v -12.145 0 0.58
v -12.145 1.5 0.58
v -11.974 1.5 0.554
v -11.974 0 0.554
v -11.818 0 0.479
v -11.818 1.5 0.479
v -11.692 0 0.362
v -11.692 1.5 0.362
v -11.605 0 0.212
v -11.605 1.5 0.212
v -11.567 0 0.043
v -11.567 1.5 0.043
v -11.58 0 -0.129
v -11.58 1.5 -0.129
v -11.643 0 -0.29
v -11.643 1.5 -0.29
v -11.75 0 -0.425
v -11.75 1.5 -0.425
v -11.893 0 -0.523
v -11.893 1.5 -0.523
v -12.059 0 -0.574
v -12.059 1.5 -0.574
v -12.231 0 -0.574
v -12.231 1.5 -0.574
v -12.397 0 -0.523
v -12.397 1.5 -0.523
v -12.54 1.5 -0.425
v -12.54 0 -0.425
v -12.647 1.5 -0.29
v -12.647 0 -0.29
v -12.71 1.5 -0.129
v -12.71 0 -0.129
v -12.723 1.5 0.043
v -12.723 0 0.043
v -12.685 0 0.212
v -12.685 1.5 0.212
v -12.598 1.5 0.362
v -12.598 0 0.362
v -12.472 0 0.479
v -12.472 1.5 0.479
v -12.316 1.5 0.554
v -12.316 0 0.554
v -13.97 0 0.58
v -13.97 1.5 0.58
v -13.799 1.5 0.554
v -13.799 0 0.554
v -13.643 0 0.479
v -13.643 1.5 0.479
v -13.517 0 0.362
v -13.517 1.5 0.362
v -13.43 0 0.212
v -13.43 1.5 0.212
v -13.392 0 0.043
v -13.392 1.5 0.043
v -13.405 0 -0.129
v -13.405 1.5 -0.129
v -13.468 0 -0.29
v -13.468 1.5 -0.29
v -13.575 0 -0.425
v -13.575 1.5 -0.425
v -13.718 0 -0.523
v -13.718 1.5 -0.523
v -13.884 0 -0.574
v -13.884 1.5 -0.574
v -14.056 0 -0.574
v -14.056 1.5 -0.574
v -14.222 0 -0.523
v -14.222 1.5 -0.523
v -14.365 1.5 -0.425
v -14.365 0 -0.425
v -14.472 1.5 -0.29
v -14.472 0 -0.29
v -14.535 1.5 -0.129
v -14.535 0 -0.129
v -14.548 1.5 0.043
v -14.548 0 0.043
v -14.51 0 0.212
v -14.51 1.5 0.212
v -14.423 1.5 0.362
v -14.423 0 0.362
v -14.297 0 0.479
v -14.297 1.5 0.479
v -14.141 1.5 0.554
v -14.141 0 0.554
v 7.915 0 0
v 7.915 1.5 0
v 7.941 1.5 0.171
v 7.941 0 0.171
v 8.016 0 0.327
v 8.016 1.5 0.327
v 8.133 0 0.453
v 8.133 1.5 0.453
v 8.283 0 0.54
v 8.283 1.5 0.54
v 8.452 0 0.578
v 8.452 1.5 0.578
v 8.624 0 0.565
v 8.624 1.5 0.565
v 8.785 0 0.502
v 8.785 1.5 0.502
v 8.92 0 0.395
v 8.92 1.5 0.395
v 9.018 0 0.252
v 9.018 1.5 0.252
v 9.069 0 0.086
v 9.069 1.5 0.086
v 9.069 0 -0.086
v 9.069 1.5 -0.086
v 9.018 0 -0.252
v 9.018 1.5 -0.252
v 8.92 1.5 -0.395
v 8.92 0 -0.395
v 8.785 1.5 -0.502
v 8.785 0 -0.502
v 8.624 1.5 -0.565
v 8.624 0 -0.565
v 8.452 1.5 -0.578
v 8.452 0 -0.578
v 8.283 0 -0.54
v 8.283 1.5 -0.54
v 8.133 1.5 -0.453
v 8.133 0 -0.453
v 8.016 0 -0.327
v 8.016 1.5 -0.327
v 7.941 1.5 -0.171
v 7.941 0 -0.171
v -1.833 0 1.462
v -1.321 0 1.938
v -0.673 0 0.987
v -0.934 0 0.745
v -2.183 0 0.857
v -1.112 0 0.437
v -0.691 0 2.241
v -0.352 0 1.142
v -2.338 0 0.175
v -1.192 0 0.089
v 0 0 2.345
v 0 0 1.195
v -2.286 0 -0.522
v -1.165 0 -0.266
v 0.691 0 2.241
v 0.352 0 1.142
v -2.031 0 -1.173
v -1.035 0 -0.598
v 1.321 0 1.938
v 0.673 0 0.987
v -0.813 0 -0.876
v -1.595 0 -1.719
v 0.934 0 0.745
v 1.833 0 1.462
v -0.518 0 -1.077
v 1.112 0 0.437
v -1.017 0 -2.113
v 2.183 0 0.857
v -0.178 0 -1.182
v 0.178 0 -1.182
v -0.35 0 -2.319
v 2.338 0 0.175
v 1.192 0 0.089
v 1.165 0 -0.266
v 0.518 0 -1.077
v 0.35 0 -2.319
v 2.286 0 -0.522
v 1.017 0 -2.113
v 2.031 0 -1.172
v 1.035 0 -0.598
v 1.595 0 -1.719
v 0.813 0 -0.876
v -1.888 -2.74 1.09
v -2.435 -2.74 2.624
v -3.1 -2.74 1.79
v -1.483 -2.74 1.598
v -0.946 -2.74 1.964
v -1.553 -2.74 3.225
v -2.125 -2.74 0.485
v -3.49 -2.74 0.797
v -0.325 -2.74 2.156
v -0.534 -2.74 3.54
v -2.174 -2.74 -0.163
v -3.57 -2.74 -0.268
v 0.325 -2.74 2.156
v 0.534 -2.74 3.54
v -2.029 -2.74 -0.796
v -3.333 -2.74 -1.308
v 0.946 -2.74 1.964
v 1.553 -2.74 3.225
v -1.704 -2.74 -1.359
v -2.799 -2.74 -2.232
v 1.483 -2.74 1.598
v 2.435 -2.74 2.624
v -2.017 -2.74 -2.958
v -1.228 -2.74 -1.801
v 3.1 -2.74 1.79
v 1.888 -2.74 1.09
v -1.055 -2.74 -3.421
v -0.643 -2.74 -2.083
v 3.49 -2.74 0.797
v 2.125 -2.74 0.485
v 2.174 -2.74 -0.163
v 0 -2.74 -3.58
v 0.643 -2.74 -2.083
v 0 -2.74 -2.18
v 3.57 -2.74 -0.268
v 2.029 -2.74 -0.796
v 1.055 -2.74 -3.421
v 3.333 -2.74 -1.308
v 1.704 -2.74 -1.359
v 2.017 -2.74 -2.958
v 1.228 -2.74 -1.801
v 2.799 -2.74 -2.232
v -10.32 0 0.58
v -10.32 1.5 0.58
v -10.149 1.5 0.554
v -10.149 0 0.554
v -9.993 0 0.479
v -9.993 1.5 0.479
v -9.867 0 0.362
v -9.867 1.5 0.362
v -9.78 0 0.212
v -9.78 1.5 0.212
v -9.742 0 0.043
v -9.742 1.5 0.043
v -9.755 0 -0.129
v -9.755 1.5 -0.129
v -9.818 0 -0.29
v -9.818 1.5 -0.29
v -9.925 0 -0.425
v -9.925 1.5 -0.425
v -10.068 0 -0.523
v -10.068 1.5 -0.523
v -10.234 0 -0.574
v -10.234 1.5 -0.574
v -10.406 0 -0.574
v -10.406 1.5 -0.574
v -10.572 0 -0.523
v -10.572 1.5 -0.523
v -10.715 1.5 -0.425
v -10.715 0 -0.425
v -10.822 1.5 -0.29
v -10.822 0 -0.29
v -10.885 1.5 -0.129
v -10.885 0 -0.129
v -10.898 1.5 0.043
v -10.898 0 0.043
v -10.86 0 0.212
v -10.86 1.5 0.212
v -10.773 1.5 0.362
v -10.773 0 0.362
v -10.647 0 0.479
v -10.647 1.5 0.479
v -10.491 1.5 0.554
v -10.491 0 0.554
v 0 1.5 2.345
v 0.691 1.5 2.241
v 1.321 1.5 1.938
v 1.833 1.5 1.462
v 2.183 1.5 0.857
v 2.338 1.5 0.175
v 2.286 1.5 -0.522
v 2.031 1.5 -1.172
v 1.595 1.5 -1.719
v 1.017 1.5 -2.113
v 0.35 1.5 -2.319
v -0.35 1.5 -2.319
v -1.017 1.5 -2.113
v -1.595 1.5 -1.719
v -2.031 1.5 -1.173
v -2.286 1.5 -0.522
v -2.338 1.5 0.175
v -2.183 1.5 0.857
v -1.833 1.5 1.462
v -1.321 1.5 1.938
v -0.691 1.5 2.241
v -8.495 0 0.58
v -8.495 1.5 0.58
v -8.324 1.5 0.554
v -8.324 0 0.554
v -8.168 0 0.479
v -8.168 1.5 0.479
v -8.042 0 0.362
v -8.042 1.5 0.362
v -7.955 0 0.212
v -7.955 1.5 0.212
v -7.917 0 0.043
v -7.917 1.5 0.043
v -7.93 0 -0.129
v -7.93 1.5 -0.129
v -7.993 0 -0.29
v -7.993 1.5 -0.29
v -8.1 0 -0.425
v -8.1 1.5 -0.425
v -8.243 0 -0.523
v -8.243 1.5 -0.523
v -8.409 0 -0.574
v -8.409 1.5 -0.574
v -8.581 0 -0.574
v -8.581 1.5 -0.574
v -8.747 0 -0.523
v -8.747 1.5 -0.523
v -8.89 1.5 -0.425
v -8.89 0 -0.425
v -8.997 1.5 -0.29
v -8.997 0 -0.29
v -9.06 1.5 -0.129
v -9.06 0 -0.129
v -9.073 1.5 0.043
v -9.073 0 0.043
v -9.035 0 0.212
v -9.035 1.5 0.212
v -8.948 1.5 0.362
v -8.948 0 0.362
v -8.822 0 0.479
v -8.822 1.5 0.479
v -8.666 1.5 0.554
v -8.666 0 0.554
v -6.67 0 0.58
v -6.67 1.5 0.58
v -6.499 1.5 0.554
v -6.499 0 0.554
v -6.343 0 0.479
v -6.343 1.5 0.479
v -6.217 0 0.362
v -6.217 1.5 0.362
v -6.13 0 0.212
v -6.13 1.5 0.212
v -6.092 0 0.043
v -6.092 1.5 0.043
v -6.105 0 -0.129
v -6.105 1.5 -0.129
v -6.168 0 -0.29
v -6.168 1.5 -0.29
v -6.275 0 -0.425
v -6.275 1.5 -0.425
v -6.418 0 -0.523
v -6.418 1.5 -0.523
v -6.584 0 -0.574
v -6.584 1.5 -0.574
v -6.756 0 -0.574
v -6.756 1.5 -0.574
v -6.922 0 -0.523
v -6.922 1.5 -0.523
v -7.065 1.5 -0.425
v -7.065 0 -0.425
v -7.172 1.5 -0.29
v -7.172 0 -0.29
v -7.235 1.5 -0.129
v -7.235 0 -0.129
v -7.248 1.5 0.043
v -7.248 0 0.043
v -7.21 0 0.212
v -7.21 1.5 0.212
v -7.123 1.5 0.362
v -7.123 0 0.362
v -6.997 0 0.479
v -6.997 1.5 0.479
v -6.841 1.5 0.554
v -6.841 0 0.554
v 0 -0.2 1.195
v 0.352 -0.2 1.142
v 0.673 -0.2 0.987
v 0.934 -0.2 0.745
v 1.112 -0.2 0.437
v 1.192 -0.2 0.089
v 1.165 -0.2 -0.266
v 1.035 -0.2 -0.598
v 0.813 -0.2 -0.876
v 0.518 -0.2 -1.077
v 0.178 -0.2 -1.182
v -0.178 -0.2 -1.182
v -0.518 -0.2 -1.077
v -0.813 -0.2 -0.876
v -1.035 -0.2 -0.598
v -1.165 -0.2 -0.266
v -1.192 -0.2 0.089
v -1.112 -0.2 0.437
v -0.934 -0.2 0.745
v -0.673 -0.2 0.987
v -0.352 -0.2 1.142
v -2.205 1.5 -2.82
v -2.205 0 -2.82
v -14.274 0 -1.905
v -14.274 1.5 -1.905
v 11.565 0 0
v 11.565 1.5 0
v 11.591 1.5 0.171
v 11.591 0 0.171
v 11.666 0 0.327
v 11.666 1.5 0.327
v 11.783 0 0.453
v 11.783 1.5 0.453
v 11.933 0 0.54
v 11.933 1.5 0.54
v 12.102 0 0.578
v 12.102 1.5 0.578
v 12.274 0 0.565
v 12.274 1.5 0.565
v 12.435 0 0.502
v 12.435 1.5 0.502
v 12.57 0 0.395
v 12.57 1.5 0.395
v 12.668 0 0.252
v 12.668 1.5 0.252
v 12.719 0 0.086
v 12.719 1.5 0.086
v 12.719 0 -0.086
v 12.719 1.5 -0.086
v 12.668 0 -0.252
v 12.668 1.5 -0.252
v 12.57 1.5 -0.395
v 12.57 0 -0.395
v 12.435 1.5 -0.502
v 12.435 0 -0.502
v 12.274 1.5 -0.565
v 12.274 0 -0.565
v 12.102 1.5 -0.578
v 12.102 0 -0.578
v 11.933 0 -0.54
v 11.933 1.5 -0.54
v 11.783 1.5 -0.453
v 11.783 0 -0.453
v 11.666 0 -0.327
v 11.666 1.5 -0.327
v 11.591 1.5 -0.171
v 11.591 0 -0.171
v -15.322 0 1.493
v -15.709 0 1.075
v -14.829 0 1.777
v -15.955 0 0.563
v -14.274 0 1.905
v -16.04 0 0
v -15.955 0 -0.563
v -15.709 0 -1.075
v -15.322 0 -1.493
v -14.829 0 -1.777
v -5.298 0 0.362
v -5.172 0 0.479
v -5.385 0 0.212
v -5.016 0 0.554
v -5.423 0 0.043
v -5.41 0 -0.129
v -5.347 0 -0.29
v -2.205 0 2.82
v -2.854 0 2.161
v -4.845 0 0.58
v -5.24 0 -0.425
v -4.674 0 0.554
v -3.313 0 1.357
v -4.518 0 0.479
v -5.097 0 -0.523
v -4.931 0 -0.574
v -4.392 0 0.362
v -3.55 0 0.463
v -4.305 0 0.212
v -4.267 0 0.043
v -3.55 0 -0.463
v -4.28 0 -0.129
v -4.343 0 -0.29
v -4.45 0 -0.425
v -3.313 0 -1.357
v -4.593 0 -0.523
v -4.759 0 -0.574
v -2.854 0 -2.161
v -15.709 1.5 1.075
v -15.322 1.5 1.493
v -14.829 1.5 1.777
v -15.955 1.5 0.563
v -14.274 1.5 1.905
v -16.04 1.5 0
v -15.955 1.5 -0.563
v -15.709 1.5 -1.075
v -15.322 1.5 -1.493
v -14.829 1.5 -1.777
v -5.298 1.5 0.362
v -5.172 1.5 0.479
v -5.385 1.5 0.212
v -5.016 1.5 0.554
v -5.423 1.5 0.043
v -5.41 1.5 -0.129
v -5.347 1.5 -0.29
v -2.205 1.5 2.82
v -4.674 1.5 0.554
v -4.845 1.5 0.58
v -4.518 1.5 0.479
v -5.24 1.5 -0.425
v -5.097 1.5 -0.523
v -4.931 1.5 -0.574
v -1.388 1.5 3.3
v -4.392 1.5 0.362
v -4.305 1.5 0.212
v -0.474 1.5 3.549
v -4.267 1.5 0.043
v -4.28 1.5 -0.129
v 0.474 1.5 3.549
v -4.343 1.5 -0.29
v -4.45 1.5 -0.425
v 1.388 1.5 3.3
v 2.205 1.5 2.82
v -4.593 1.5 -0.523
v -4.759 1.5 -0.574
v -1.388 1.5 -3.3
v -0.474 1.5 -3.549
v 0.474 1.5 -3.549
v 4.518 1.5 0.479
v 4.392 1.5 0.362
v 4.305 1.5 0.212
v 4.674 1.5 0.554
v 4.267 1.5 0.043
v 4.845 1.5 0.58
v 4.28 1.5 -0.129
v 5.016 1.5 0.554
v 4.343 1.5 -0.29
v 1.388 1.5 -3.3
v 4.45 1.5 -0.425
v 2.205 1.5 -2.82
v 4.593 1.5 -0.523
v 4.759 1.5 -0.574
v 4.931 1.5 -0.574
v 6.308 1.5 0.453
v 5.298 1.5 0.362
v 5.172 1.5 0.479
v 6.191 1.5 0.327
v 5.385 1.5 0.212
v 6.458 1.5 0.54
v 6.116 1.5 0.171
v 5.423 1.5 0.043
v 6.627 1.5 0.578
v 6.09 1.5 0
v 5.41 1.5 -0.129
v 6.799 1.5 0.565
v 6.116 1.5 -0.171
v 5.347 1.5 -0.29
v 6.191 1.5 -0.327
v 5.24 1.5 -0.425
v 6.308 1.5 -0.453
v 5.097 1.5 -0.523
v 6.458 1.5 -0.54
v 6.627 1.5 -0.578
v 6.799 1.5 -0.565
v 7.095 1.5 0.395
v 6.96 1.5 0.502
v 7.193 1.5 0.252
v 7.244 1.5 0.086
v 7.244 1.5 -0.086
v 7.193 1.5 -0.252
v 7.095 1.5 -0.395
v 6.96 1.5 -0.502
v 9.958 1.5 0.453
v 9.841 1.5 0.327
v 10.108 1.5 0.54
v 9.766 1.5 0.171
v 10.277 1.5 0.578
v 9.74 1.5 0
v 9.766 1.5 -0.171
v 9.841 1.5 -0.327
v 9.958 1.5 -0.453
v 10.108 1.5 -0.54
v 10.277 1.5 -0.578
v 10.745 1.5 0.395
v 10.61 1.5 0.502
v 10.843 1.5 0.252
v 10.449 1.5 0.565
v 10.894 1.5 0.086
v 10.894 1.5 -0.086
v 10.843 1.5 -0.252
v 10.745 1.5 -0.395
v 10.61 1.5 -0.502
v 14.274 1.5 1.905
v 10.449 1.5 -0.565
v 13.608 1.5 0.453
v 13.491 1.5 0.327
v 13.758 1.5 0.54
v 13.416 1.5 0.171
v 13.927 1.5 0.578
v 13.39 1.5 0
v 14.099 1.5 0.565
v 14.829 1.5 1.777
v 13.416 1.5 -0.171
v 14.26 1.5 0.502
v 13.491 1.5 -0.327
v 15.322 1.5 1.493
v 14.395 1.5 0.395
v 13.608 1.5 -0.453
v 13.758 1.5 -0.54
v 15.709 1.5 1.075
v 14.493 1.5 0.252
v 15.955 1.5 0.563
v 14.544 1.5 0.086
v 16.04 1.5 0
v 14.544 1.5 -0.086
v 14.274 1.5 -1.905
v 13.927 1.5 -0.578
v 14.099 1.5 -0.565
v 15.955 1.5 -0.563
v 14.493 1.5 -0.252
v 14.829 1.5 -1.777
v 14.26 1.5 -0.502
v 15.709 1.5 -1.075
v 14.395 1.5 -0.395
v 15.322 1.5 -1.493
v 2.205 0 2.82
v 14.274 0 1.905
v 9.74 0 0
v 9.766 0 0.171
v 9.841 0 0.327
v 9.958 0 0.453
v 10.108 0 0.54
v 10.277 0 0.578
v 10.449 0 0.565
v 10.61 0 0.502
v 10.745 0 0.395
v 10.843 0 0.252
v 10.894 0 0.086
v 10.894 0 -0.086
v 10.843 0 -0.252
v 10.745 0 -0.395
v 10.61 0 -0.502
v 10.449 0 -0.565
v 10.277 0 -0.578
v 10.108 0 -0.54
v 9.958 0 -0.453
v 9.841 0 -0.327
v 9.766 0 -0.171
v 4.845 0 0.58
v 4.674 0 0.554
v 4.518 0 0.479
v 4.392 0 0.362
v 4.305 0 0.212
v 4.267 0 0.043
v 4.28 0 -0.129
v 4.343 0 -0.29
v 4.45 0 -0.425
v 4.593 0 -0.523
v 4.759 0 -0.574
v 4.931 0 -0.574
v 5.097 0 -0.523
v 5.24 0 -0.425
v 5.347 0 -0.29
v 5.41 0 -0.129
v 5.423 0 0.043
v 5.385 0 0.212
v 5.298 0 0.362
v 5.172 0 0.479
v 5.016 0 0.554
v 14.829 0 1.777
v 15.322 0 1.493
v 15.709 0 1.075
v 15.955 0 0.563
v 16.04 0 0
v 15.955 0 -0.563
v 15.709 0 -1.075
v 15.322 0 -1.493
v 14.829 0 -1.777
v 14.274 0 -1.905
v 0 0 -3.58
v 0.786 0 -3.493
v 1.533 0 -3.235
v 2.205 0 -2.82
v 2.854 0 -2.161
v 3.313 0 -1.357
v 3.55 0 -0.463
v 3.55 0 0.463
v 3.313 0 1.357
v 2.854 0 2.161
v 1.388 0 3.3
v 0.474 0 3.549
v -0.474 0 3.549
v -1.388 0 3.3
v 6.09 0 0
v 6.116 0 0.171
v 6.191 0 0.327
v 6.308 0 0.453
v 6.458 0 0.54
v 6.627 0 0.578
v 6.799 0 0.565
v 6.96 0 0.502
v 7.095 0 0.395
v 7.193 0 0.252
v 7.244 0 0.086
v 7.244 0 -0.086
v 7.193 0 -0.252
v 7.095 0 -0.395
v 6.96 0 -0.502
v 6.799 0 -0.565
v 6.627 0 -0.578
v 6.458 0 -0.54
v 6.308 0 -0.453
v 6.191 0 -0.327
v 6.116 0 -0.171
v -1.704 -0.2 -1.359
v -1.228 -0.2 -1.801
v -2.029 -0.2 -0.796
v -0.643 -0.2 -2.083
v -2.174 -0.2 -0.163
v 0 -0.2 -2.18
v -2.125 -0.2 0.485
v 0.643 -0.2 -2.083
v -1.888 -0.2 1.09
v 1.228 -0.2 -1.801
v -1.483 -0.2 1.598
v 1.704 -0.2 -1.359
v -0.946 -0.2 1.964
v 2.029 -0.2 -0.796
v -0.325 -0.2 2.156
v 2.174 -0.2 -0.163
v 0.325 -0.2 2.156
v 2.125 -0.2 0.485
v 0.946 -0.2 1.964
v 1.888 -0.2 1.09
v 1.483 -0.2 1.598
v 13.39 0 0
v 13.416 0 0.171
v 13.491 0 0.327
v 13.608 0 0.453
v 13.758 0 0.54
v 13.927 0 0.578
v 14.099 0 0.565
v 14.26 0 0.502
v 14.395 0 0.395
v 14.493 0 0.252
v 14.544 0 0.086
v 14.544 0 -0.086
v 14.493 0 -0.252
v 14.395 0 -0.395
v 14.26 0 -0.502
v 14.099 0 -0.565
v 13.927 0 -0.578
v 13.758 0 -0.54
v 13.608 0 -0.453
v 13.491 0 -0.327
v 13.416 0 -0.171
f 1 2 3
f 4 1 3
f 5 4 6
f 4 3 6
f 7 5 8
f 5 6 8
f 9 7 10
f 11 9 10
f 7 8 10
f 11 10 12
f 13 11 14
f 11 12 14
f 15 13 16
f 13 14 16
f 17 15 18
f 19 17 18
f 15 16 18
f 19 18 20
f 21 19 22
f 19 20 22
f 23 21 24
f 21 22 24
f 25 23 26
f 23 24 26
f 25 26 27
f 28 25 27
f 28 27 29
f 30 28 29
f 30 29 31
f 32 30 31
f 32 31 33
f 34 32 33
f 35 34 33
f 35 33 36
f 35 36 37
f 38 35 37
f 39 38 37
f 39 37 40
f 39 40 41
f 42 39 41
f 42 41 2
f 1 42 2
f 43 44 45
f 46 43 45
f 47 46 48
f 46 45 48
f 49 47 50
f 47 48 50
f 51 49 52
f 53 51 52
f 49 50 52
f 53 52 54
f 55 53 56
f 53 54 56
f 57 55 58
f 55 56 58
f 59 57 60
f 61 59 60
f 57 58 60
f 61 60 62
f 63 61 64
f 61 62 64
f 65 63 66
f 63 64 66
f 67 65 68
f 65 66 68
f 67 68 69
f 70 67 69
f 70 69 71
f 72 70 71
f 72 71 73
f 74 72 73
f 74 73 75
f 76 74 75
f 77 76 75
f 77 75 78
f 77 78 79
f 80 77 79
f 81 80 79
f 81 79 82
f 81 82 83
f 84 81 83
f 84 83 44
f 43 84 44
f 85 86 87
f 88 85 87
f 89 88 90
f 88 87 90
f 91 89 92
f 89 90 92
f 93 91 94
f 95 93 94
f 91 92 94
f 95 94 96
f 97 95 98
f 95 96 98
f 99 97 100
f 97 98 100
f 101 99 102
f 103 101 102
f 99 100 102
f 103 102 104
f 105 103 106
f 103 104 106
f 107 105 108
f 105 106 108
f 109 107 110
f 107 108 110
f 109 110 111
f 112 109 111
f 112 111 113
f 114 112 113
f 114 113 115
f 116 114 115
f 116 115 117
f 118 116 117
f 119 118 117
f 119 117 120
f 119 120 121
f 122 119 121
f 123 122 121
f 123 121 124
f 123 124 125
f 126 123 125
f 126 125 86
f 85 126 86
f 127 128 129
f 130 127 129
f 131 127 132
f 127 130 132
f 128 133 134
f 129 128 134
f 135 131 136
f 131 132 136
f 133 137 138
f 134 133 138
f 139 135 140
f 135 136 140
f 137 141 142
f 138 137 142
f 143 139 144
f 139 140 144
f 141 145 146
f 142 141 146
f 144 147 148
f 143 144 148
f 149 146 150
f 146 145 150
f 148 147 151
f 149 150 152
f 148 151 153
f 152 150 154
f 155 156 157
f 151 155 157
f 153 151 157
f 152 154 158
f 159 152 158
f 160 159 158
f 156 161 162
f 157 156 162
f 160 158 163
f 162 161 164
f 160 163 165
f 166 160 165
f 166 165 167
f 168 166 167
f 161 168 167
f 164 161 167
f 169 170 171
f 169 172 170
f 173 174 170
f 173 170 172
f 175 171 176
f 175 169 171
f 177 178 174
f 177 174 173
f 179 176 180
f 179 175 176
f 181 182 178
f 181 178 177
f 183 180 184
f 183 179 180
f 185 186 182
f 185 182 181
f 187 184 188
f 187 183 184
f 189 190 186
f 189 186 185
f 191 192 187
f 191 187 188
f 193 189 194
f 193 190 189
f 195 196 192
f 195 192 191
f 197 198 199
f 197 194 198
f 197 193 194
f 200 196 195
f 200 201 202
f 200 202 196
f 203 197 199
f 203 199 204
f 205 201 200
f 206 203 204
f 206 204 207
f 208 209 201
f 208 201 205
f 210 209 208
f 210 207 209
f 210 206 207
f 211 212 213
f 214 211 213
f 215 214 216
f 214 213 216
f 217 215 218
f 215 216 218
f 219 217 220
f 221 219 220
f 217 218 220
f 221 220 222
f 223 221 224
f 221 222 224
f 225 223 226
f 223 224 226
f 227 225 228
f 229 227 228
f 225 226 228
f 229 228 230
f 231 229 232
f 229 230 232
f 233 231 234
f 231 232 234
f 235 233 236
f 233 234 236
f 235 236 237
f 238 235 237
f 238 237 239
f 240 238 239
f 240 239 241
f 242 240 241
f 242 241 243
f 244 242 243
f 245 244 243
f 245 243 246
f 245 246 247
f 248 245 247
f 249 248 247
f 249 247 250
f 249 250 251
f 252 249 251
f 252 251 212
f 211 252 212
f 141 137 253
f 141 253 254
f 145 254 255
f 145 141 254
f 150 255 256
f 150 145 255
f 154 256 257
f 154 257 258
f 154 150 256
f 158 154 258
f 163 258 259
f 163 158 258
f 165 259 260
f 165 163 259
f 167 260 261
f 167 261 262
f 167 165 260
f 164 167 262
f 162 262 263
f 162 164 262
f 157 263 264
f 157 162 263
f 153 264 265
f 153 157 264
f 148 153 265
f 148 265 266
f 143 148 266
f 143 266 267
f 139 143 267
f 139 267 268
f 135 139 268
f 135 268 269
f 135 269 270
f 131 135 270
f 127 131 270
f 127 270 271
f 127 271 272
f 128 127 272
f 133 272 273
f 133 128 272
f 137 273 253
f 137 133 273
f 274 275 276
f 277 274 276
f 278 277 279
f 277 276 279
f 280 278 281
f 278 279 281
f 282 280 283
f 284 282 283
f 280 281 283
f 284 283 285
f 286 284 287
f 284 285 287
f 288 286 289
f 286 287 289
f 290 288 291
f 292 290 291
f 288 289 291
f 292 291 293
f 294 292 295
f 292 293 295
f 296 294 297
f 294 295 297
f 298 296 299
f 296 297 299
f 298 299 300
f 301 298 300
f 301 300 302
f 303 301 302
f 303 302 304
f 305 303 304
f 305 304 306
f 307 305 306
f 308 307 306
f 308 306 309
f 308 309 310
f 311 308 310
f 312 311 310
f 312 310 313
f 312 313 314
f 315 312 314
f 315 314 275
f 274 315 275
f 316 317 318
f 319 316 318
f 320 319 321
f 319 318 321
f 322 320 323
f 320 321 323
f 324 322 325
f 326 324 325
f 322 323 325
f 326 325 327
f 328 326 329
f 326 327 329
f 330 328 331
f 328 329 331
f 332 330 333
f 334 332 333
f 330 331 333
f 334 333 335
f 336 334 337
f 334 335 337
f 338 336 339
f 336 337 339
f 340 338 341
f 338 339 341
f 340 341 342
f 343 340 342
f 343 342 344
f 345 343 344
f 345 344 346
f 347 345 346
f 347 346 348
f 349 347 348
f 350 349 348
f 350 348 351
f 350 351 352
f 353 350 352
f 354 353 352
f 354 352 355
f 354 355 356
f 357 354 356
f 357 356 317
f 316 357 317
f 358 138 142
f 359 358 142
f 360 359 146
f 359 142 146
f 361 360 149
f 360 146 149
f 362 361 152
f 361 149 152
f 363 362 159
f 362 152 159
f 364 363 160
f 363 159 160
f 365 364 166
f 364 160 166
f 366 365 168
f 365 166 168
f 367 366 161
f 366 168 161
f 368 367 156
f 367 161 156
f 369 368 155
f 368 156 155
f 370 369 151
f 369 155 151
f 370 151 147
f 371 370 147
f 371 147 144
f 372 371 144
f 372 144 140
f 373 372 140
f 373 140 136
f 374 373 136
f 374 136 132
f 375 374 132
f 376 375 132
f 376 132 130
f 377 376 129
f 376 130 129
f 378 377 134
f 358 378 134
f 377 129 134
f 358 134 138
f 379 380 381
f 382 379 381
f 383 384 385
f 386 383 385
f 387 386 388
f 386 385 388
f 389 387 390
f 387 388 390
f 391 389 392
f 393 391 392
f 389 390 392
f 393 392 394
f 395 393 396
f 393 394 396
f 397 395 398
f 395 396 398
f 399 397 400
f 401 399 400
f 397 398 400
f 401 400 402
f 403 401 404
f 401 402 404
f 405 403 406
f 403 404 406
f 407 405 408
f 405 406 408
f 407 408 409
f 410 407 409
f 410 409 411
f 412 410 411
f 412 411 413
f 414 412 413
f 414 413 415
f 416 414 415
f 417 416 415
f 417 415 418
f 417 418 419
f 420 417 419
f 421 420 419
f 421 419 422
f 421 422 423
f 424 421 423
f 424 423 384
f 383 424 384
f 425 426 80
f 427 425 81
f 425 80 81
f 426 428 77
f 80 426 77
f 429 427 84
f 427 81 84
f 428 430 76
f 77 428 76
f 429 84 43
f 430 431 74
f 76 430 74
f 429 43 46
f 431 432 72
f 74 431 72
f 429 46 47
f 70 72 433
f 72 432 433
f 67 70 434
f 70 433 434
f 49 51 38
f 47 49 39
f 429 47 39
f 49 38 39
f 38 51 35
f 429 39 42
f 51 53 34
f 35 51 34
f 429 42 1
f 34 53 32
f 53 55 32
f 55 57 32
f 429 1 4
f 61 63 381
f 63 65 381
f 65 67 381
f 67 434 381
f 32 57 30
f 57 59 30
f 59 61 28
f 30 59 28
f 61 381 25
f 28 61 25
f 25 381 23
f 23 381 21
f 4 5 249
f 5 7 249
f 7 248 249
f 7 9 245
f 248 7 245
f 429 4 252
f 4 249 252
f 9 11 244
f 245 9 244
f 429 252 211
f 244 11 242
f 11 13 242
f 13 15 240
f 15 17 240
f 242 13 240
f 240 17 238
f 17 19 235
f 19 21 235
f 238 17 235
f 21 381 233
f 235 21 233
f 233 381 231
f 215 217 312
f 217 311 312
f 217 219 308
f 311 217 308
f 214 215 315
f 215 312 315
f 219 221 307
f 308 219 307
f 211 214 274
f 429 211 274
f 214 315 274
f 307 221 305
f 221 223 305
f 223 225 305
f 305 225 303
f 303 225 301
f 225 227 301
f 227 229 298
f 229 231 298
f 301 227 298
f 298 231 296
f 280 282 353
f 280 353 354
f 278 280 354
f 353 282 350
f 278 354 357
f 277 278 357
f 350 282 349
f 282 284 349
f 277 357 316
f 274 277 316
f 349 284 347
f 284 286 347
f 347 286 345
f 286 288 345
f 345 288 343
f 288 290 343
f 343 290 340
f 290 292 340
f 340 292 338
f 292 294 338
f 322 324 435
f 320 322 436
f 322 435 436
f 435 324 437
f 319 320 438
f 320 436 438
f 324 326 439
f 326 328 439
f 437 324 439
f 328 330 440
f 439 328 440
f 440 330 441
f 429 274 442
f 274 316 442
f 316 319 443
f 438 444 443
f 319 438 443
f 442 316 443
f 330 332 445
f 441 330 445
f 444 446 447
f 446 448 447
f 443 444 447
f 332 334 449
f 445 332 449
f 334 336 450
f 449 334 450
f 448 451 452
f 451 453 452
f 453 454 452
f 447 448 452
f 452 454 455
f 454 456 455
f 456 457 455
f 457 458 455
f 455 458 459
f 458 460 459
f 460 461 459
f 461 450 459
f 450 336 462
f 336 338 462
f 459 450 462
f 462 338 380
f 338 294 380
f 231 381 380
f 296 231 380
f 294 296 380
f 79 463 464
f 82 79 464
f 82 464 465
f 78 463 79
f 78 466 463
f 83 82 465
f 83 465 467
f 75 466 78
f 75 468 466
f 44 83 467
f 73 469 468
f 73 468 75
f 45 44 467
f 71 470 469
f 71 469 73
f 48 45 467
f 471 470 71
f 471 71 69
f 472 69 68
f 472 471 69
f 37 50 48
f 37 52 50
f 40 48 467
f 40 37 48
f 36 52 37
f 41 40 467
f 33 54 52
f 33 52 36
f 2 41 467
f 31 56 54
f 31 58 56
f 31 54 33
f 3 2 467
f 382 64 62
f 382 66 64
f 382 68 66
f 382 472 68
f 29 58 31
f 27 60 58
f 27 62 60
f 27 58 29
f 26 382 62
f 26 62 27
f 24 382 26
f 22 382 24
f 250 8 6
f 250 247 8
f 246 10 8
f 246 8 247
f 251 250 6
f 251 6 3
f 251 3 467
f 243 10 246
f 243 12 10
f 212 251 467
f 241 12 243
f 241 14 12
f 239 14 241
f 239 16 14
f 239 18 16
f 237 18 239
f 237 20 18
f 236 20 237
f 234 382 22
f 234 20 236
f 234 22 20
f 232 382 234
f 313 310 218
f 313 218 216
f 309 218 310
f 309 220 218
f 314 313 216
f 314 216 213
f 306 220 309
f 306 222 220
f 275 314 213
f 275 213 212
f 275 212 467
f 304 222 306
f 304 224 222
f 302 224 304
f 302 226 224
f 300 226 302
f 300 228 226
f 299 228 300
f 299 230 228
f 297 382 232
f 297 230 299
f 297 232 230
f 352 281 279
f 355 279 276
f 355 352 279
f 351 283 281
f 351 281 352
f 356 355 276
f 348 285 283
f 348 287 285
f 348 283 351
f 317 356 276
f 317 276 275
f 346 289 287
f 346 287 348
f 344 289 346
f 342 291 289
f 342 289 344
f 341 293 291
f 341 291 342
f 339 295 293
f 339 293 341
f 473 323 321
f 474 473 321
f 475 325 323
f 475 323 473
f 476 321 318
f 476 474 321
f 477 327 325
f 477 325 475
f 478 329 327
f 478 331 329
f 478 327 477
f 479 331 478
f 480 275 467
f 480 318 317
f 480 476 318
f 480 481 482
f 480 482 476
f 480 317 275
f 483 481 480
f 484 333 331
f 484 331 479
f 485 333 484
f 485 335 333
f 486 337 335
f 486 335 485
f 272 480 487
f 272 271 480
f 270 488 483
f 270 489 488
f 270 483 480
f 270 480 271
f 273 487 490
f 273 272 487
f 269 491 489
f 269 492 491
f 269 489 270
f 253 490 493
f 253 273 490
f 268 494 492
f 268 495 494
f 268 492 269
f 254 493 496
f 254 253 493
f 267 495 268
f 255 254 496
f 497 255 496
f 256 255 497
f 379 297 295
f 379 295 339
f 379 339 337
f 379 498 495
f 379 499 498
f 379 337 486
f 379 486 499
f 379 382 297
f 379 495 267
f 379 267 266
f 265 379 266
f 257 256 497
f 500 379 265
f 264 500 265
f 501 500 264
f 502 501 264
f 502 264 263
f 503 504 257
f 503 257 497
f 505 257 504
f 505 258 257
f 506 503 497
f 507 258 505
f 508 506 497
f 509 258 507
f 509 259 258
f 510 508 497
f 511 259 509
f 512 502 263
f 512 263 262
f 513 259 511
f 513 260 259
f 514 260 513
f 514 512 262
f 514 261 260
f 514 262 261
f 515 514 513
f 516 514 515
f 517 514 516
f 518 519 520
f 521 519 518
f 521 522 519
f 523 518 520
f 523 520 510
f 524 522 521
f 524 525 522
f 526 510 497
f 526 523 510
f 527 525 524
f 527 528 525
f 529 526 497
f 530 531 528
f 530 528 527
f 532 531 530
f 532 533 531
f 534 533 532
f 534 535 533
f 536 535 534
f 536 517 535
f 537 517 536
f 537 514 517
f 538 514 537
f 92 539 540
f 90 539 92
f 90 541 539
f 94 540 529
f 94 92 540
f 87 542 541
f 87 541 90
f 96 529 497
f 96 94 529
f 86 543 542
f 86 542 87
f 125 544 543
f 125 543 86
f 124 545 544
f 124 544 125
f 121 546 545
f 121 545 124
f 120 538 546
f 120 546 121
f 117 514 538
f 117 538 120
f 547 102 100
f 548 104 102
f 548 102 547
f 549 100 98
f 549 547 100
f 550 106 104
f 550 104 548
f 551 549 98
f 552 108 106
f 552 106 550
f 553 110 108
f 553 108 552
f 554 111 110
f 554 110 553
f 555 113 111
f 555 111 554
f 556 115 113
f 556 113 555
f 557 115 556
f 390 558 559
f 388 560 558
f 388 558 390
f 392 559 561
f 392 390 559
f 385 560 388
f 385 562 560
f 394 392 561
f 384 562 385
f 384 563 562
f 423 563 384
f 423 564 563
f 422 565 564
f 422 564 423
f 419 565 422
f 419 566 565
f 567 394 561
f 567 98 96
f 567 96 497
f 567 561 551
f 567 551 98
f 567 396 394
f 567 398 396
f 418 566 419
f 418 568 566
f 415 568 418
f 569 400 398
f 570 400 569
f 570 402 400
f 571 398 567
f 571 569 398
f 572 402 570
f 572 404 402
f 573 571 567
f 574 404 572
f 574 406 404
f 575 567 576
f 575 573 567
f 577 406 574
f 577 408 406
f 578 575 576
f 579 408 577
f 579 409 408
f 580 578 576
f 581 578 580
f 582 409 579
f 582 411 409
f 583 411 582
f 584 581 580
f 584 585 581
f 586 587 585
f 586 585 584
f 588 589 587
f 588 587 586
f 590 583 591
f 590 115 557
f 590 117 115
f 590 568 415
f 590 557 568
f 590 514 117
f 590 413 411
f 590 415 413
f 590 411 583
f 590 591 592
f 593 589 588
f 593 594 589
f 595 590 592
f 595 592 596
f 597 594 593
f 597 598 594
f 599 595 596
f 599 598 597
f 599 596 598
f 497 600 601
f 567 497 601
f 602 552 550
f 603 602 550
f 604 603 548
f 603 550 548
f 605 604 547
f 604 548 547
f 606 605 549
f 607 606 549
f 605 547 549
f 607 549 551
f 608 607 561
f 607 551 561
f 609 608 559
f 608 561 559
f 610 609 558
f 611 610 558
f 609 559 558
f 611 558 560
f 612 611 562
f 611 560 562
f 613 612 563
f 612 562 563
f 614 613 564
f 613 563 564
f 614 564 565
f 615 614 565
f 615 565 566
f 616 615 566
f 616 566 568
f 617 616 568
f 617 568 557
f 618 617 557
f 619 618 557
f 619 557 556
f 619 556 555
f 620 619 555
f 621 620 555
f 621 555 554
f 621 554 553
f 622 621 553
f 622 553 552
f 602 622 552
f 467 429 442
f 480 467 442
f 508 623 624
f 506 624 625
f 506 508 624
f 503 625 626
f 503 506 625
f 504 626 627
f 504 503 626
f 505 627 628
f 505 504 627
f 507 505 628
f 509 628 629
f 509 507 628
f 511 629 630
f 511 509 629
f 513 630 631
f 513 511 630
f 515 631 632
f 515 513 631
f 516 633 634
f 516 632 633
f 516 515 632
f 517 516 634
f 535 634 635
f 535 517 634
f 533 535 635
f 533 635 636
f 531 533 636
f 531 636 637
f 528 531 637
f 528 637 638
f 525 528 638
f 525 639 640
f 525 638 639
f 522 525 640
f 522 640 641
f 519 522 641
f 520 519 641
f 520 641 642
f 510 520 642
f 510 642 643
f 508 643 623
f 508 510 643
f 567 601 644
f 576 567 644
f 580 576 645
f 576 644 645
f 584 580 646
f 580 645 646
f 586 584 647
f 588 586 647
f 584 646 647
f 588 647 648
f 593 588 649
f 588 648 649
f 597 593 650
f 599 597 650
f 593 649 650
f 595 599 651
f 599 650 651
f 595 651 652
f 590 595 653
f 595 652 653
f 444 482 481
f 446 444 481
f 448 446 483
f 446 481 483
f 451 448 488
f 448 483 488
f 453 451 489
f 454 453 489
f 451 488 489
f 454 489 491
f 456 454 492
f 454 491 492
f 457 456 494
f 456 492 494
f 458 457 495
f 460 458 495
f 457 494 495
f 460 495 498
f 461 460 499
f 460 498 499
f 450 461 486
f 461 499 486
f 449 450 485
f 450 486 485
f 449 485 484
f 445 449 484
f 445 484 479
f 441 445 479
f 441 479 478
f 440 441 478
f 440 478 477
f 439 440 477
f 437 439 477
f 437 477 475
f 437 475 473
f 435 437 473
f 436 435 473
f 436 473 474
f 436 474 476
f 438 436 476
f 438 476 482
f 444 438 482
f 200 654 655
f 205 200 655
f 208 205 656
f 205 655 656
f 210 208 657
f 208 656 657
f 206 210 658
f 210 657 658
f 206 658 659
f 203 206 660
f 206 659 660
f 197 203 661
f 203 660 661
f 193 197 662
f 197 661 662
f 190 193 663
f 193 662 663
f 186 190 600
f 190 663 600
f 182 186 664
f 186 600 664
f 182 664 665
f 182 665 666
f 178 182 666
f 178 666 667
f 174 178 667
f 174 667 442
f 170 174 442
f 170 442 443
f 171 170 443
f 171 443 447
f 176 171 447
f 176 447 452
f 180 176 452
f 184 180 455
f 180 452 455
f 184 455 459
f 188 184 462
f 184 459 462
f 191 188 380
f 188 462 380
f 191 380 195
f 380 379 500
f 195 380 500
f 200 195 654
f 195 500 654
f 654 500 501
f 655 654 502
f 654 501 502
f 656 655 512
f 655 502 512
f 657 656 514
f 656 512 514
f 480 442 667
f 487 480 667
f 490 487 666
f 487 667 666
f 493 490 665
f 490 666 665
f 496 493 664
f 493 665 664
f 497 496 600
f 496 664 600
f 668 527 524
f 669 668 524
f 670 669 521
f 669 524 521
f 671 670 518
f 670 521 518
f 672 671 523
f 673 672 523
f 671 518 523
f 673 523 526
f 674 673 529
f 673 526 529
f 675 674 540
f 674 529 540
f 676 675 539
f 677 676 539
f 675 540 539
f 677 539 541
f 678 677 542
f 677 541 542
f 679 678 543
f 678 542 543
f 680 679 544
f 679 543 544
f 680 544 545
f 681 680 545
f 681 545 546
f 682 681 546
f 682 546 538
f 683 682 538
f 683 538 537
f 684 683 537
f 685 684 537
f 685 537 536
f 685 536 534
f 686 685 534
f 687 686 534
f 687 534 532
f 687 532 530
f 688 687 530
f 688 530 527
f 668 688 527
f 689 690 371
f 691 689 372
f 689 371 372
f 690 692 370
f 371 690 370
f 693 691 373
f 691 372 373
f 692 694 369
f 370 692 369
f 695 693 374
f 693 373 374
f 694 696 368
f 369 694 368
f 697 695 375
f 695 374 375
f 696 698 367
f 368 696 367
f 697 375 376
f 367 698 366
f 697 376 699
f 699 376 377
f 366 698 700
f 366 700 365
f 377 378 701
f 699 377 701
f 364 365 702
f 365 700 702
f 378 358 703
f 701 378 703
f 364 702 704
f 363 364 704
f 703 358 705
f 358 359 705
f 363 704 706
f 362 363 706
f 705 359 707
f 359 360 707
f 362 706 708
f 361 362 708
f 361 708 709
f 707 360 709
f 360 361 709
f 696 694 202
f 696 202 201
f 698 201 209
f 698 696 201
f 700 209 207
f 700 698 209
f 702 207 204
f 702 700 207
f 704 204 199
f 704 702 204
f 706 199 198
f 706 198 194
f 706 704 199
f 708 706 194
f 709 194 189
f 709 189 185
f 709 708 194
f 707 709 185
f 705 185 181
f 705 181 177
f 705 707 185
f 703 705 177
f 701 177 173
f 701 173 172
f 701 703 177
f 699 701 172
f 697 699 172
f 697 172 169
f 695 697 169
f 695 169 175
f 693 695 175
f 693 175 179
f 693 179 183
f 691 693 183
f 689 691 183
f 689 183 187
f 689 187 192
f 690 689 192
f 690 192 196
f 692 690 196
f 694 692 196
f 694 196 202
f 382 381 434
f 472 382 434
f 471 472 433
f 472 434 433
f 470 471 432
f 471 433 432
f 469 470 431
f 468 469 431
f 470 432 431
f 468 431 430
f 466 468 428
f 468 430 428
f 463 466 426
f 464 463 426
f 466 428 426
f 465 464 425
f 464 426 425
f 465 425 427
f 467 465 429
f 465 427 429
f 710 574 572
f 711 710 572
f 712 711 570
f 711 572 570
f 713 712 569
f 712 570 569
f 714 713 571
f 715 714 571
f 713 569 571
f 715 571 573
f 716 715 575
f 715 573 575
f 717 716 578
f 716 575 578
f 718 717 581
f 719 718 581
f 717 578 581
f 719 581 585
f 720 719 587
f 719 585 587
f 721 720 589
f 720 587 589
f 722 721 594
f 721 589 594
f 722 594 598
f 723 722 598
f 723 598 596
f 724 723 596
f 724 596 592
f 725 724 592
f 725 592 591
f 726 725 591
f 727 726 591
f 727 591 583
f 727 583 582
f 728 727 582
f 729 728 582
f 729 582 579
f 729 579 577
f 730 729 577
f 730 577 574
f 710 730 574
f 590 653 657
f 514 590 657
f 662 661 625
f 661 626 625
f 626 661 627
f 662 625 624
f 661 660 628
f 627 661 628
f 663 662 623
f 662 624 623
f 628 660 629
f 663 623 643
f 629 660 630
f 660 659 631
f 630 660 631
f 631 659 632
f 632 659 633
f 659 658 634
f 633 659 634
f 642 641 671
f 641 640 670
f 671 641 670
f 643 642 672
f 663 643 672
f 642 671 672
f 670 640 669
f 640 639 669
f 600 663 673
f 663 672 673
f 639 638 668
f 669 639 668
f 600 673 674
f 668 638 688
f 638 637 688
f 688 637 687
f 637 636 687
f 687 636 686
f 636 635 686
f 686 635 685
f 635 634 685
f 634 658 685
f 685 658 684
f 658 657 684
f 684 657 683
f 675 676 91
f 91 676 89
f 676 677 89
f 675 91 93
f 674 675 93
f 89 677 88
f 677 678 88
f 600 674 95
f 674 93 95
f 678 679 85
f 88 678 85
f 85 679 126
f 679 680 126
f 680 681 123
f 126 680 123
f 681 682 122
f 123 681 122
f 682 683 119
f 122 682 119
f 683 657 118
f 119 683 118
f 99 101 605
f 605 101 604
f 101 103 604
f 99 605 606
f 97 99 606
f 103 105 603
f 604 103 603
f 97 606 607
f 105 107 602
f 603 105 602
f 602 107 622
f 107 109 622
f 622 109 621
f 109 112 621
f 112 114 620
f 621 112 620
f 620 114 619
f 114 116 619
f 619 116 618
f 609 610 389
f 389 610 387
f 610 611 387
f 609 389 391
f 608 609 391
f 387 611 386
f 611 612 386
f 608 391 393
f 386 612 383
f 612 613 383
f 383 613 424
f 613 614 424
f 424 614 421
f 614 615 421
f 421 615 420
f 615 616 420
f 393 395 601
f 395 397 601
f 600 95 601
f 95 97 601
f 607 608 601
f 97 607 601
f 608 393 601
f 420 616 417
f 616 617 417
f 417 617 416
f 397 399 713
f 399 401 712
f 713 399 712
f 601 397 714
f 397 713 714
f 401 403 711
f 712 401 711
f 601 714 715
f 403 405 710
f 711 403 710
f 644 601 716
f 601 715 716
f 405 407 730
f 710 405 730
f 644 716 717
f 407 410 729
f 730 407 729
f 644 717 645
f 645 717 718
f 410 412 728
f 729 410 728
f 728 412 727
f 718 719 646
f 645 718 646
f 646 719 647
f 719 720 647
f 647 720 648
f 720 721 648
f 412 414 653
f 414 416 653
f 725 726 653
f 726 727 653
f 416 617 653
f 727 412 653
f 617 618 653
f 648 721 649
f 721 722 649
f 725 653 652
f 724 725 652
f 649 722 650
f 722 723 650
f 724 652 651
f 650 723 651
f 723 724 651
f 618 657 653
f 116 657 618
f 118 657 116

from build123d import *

# Parameters (mm, degrees)
SKETCH1_R               = 2.345
EXTRUDE1_DEPTH          = 1.5
SKETCH2_R               = 3.58
SKETCH2_R_2             = 2.18
EXTRUDE2_DEPTH          = 2.74
SKETCH3_R               = 2.345
SKETCH3_R_2             = 1.195
EXTRUDE3_DEPTH          = 0.2
SKETCH4_R               = 0.58
EXTRUDE4_DEPTH          = 5.24
LPATTERN1_COUNT         = 6
LPATTERN1_PITCH         = 1.825
MIRROR1_COPY_1_SKETCH_R = 0.58
MIRROR1_COPY_1_DEPTH    = 5.24
MIRROR1_COPY_2_SKETCH_R = 0.58
MIRROR1_COPY_2_DEPTH    = 5.24
MIRROR1_COPY_3_SKETCH_R = 0.58
MIRROR1_COPY_3_DEPTH    = 5.24
MIRROR1_COPY_4_SKETCH_R = 0.58
MIRROR1_COPY_4_DEPTH    = 5.24
MIRROR1_COPY_5_SKETCH_R = 0.58
MIRROR1_COPY_5_DEPTH    = 5.24


with BuildPart() as part:
    # Sketch1 → Extrude1 (new body)
    with BuildSketch(Plane(origin=(0, 0, 0), x_dir=(1, 0, 0), z_dir=(0, 1, 0))):
        with BuildLine():
            Line((-14.274464235, -1.904528835), (-2.2054478, -2.82))
            ThreePointArc((-2.2054478, -2.82), (0, -3.58), (2.2054478, -2.82))
            Line((2.2054478, -2.82), (14.274464235, -1.904528835))
            ThreePointArc((14.274464235, -1.904528835), (16.04, 0), (14.274464235, 1.904528835))
            Line((14.274464235, 1.904528835), (2.2054478, 2.82))
            ThreePointArc((2.2054478, 2.82), (0, 3.58), (-2.2054478, 2.82))
            Line((-2.2054478, 2.82), (-14.274464235, 1.904528835))
            ThreePointArc((-14.274464235, 1.904528835), (-16.04, 0), (-14.274464235, -1.904528835))
        make_face()
        with Locations(Location((0, 0, 0), (0, 0, 270))):  # turned: the seam where the file's is
            Circle(SKETCH1_R, mode=Mode.SUBTRACT)
    extrude(amount=EXTRUDE1_DEPTH)

    # Sketch2 → Extrude2 (add)
    with BuildSketch(Plane.XZ):
        with Locations(Location((0, 0, 0), (0, 0, 270))):  # turned: the seam where the file's is
            Circle(SKETCH2_R)
        with Locations(Location((0, 0, 0), (0, 0, 270))):  # turned: the seam where the file's is
            Circle(SKETCH2_R_2, mode=Mode.SUBTRACT)
    extrude(amount=EXTRUDE2_DEPTH)

    # Sketch3 → Extrude3 (add)
    with BuildSketch(Plane(origin=(0, 0, 0), x_dir=(-1, 0, 0), z_dir=(0, 1, 0))):
        with Locations(Location((0, 0, 0), (0, 0, 90))):  # turned: the seam where the file's is
            Circle(SKETCH3_R)
        with Locations(Location((0, 0, 0), (0, 0, 90))):  # turned: the seam where the file's is
            Circle(SKETCH3_R_2, mode=Mode.SUBTRACT)
    extrude(amount=-EXTRUDE3_DEPTH)

    # Sketch4 → Extrude4 (cut, through all)
    with BuildSketch(Plane(origin=(0, 1.5, 0), x_dir=(1, 0, 0), z_dir=(0, 1, 0))):
        with Locations(Location((-4.845, 0, 0), (0, 0, 270))):  # turned: the seam where the file's is
            Circle(SKETCH4_R)
    extrude4 = extrude(amount=-EXTRUDE4_DEPTH, mode=Mode.SUBTRACT)

    # LPattern1: Extrude4 ×6
    with Locations(*[(-i * LPATTERN1_PITCH, 0, 0) for i in range(1, LPATTERN1_COUNT)]):
        add(extrude4, mode=Mode.SUBTRACT)

    # Mirror1: Extrude4 across plane
    add(extrude4.mirror(Plane(origin=(0, 0, 0), x_dir=(0, 0, 1), z_dir=(1, 0, 0))), mode=Mode.SUBTRACT)

    # Mirror1 copy 1 sketch → Mirror1 copy 1 (cut, through all)
    with BuildSketch(Plane(origin=(1.825, 1.5, 0), x_dir=(-1, 0, 0), z_dir=(0, 1, 0))):
        with Locations((-4.845, 0)):
            Circle(MIRROR1_COPY_1_SKETCH_R)
    extrude(amount=-MIRROR1_COPY_1_DEPTH, mode=Mode.SUBTRACT)

    # Mirror1 copy 2 sketch → Mirror1 copy 2 (cut, through all)
    with BuildSketch(Plane(origin=(3.65, 1.5, 0), x_dir=(-1, 0, 0), z_dir=(0, 1, 0))):
        with Locations((-4.845, 0)):
            Circle(MIRROR1_COPY_2_SKETCH_R)
    extrude(amount=-MIRROR1_COPY_2_DEPTH, mode=Mode.SUBTRACT)

    # Mirror1 copy 3 sketch → Mirror1 copy 3 (cut, through all)
    with BuildSketch(Plane(origin=(5.475, 1.5, 0), x_dir=(-1, 0, 0), z_dir=(0, 1, 0))):
        with Locations((-4.845, 0)):
            Circle(MIRROR1_COPY_3_SKETCH_R)
    extrude(amount=-MIRROR1_COPY_3_DEPTH, mode=Mode.SUBTRACT)

    # Mirror1 copy 4 sketch → Mirror1 copy 4 (cut, through all)
    with BuildSketch(Plane(origin=(7.3, 1.5, 0), x_dir=(-1, 0, 0), z_dir=(0, 1, 0))):
        with Locations((-4.845, 0)):
            Circle(MIRROR1_COPY_4_SKETCH_R)
    extrude(amount=-MIRROR1_COPY_4_DEPTH, mode=Mode.SUBTRACT)

    # Mirror1 copy 5 sketch → Mirror1 copy 5 (cut, through all)
    with BuildSketch(Plane(origin=(9.125, 1.5, 0), x_dir=(-1, 0, 0), z_dir=(0, 1, 0))):
        with Locations((-4.845, 0)):
            Circle(MIRROR1_COPY_5_SKETCH_R)
    extrude(amount=-MIRROR1_COPY_5_DEPTH, mode=Mode.SUBTRACT)


solid = part.part
